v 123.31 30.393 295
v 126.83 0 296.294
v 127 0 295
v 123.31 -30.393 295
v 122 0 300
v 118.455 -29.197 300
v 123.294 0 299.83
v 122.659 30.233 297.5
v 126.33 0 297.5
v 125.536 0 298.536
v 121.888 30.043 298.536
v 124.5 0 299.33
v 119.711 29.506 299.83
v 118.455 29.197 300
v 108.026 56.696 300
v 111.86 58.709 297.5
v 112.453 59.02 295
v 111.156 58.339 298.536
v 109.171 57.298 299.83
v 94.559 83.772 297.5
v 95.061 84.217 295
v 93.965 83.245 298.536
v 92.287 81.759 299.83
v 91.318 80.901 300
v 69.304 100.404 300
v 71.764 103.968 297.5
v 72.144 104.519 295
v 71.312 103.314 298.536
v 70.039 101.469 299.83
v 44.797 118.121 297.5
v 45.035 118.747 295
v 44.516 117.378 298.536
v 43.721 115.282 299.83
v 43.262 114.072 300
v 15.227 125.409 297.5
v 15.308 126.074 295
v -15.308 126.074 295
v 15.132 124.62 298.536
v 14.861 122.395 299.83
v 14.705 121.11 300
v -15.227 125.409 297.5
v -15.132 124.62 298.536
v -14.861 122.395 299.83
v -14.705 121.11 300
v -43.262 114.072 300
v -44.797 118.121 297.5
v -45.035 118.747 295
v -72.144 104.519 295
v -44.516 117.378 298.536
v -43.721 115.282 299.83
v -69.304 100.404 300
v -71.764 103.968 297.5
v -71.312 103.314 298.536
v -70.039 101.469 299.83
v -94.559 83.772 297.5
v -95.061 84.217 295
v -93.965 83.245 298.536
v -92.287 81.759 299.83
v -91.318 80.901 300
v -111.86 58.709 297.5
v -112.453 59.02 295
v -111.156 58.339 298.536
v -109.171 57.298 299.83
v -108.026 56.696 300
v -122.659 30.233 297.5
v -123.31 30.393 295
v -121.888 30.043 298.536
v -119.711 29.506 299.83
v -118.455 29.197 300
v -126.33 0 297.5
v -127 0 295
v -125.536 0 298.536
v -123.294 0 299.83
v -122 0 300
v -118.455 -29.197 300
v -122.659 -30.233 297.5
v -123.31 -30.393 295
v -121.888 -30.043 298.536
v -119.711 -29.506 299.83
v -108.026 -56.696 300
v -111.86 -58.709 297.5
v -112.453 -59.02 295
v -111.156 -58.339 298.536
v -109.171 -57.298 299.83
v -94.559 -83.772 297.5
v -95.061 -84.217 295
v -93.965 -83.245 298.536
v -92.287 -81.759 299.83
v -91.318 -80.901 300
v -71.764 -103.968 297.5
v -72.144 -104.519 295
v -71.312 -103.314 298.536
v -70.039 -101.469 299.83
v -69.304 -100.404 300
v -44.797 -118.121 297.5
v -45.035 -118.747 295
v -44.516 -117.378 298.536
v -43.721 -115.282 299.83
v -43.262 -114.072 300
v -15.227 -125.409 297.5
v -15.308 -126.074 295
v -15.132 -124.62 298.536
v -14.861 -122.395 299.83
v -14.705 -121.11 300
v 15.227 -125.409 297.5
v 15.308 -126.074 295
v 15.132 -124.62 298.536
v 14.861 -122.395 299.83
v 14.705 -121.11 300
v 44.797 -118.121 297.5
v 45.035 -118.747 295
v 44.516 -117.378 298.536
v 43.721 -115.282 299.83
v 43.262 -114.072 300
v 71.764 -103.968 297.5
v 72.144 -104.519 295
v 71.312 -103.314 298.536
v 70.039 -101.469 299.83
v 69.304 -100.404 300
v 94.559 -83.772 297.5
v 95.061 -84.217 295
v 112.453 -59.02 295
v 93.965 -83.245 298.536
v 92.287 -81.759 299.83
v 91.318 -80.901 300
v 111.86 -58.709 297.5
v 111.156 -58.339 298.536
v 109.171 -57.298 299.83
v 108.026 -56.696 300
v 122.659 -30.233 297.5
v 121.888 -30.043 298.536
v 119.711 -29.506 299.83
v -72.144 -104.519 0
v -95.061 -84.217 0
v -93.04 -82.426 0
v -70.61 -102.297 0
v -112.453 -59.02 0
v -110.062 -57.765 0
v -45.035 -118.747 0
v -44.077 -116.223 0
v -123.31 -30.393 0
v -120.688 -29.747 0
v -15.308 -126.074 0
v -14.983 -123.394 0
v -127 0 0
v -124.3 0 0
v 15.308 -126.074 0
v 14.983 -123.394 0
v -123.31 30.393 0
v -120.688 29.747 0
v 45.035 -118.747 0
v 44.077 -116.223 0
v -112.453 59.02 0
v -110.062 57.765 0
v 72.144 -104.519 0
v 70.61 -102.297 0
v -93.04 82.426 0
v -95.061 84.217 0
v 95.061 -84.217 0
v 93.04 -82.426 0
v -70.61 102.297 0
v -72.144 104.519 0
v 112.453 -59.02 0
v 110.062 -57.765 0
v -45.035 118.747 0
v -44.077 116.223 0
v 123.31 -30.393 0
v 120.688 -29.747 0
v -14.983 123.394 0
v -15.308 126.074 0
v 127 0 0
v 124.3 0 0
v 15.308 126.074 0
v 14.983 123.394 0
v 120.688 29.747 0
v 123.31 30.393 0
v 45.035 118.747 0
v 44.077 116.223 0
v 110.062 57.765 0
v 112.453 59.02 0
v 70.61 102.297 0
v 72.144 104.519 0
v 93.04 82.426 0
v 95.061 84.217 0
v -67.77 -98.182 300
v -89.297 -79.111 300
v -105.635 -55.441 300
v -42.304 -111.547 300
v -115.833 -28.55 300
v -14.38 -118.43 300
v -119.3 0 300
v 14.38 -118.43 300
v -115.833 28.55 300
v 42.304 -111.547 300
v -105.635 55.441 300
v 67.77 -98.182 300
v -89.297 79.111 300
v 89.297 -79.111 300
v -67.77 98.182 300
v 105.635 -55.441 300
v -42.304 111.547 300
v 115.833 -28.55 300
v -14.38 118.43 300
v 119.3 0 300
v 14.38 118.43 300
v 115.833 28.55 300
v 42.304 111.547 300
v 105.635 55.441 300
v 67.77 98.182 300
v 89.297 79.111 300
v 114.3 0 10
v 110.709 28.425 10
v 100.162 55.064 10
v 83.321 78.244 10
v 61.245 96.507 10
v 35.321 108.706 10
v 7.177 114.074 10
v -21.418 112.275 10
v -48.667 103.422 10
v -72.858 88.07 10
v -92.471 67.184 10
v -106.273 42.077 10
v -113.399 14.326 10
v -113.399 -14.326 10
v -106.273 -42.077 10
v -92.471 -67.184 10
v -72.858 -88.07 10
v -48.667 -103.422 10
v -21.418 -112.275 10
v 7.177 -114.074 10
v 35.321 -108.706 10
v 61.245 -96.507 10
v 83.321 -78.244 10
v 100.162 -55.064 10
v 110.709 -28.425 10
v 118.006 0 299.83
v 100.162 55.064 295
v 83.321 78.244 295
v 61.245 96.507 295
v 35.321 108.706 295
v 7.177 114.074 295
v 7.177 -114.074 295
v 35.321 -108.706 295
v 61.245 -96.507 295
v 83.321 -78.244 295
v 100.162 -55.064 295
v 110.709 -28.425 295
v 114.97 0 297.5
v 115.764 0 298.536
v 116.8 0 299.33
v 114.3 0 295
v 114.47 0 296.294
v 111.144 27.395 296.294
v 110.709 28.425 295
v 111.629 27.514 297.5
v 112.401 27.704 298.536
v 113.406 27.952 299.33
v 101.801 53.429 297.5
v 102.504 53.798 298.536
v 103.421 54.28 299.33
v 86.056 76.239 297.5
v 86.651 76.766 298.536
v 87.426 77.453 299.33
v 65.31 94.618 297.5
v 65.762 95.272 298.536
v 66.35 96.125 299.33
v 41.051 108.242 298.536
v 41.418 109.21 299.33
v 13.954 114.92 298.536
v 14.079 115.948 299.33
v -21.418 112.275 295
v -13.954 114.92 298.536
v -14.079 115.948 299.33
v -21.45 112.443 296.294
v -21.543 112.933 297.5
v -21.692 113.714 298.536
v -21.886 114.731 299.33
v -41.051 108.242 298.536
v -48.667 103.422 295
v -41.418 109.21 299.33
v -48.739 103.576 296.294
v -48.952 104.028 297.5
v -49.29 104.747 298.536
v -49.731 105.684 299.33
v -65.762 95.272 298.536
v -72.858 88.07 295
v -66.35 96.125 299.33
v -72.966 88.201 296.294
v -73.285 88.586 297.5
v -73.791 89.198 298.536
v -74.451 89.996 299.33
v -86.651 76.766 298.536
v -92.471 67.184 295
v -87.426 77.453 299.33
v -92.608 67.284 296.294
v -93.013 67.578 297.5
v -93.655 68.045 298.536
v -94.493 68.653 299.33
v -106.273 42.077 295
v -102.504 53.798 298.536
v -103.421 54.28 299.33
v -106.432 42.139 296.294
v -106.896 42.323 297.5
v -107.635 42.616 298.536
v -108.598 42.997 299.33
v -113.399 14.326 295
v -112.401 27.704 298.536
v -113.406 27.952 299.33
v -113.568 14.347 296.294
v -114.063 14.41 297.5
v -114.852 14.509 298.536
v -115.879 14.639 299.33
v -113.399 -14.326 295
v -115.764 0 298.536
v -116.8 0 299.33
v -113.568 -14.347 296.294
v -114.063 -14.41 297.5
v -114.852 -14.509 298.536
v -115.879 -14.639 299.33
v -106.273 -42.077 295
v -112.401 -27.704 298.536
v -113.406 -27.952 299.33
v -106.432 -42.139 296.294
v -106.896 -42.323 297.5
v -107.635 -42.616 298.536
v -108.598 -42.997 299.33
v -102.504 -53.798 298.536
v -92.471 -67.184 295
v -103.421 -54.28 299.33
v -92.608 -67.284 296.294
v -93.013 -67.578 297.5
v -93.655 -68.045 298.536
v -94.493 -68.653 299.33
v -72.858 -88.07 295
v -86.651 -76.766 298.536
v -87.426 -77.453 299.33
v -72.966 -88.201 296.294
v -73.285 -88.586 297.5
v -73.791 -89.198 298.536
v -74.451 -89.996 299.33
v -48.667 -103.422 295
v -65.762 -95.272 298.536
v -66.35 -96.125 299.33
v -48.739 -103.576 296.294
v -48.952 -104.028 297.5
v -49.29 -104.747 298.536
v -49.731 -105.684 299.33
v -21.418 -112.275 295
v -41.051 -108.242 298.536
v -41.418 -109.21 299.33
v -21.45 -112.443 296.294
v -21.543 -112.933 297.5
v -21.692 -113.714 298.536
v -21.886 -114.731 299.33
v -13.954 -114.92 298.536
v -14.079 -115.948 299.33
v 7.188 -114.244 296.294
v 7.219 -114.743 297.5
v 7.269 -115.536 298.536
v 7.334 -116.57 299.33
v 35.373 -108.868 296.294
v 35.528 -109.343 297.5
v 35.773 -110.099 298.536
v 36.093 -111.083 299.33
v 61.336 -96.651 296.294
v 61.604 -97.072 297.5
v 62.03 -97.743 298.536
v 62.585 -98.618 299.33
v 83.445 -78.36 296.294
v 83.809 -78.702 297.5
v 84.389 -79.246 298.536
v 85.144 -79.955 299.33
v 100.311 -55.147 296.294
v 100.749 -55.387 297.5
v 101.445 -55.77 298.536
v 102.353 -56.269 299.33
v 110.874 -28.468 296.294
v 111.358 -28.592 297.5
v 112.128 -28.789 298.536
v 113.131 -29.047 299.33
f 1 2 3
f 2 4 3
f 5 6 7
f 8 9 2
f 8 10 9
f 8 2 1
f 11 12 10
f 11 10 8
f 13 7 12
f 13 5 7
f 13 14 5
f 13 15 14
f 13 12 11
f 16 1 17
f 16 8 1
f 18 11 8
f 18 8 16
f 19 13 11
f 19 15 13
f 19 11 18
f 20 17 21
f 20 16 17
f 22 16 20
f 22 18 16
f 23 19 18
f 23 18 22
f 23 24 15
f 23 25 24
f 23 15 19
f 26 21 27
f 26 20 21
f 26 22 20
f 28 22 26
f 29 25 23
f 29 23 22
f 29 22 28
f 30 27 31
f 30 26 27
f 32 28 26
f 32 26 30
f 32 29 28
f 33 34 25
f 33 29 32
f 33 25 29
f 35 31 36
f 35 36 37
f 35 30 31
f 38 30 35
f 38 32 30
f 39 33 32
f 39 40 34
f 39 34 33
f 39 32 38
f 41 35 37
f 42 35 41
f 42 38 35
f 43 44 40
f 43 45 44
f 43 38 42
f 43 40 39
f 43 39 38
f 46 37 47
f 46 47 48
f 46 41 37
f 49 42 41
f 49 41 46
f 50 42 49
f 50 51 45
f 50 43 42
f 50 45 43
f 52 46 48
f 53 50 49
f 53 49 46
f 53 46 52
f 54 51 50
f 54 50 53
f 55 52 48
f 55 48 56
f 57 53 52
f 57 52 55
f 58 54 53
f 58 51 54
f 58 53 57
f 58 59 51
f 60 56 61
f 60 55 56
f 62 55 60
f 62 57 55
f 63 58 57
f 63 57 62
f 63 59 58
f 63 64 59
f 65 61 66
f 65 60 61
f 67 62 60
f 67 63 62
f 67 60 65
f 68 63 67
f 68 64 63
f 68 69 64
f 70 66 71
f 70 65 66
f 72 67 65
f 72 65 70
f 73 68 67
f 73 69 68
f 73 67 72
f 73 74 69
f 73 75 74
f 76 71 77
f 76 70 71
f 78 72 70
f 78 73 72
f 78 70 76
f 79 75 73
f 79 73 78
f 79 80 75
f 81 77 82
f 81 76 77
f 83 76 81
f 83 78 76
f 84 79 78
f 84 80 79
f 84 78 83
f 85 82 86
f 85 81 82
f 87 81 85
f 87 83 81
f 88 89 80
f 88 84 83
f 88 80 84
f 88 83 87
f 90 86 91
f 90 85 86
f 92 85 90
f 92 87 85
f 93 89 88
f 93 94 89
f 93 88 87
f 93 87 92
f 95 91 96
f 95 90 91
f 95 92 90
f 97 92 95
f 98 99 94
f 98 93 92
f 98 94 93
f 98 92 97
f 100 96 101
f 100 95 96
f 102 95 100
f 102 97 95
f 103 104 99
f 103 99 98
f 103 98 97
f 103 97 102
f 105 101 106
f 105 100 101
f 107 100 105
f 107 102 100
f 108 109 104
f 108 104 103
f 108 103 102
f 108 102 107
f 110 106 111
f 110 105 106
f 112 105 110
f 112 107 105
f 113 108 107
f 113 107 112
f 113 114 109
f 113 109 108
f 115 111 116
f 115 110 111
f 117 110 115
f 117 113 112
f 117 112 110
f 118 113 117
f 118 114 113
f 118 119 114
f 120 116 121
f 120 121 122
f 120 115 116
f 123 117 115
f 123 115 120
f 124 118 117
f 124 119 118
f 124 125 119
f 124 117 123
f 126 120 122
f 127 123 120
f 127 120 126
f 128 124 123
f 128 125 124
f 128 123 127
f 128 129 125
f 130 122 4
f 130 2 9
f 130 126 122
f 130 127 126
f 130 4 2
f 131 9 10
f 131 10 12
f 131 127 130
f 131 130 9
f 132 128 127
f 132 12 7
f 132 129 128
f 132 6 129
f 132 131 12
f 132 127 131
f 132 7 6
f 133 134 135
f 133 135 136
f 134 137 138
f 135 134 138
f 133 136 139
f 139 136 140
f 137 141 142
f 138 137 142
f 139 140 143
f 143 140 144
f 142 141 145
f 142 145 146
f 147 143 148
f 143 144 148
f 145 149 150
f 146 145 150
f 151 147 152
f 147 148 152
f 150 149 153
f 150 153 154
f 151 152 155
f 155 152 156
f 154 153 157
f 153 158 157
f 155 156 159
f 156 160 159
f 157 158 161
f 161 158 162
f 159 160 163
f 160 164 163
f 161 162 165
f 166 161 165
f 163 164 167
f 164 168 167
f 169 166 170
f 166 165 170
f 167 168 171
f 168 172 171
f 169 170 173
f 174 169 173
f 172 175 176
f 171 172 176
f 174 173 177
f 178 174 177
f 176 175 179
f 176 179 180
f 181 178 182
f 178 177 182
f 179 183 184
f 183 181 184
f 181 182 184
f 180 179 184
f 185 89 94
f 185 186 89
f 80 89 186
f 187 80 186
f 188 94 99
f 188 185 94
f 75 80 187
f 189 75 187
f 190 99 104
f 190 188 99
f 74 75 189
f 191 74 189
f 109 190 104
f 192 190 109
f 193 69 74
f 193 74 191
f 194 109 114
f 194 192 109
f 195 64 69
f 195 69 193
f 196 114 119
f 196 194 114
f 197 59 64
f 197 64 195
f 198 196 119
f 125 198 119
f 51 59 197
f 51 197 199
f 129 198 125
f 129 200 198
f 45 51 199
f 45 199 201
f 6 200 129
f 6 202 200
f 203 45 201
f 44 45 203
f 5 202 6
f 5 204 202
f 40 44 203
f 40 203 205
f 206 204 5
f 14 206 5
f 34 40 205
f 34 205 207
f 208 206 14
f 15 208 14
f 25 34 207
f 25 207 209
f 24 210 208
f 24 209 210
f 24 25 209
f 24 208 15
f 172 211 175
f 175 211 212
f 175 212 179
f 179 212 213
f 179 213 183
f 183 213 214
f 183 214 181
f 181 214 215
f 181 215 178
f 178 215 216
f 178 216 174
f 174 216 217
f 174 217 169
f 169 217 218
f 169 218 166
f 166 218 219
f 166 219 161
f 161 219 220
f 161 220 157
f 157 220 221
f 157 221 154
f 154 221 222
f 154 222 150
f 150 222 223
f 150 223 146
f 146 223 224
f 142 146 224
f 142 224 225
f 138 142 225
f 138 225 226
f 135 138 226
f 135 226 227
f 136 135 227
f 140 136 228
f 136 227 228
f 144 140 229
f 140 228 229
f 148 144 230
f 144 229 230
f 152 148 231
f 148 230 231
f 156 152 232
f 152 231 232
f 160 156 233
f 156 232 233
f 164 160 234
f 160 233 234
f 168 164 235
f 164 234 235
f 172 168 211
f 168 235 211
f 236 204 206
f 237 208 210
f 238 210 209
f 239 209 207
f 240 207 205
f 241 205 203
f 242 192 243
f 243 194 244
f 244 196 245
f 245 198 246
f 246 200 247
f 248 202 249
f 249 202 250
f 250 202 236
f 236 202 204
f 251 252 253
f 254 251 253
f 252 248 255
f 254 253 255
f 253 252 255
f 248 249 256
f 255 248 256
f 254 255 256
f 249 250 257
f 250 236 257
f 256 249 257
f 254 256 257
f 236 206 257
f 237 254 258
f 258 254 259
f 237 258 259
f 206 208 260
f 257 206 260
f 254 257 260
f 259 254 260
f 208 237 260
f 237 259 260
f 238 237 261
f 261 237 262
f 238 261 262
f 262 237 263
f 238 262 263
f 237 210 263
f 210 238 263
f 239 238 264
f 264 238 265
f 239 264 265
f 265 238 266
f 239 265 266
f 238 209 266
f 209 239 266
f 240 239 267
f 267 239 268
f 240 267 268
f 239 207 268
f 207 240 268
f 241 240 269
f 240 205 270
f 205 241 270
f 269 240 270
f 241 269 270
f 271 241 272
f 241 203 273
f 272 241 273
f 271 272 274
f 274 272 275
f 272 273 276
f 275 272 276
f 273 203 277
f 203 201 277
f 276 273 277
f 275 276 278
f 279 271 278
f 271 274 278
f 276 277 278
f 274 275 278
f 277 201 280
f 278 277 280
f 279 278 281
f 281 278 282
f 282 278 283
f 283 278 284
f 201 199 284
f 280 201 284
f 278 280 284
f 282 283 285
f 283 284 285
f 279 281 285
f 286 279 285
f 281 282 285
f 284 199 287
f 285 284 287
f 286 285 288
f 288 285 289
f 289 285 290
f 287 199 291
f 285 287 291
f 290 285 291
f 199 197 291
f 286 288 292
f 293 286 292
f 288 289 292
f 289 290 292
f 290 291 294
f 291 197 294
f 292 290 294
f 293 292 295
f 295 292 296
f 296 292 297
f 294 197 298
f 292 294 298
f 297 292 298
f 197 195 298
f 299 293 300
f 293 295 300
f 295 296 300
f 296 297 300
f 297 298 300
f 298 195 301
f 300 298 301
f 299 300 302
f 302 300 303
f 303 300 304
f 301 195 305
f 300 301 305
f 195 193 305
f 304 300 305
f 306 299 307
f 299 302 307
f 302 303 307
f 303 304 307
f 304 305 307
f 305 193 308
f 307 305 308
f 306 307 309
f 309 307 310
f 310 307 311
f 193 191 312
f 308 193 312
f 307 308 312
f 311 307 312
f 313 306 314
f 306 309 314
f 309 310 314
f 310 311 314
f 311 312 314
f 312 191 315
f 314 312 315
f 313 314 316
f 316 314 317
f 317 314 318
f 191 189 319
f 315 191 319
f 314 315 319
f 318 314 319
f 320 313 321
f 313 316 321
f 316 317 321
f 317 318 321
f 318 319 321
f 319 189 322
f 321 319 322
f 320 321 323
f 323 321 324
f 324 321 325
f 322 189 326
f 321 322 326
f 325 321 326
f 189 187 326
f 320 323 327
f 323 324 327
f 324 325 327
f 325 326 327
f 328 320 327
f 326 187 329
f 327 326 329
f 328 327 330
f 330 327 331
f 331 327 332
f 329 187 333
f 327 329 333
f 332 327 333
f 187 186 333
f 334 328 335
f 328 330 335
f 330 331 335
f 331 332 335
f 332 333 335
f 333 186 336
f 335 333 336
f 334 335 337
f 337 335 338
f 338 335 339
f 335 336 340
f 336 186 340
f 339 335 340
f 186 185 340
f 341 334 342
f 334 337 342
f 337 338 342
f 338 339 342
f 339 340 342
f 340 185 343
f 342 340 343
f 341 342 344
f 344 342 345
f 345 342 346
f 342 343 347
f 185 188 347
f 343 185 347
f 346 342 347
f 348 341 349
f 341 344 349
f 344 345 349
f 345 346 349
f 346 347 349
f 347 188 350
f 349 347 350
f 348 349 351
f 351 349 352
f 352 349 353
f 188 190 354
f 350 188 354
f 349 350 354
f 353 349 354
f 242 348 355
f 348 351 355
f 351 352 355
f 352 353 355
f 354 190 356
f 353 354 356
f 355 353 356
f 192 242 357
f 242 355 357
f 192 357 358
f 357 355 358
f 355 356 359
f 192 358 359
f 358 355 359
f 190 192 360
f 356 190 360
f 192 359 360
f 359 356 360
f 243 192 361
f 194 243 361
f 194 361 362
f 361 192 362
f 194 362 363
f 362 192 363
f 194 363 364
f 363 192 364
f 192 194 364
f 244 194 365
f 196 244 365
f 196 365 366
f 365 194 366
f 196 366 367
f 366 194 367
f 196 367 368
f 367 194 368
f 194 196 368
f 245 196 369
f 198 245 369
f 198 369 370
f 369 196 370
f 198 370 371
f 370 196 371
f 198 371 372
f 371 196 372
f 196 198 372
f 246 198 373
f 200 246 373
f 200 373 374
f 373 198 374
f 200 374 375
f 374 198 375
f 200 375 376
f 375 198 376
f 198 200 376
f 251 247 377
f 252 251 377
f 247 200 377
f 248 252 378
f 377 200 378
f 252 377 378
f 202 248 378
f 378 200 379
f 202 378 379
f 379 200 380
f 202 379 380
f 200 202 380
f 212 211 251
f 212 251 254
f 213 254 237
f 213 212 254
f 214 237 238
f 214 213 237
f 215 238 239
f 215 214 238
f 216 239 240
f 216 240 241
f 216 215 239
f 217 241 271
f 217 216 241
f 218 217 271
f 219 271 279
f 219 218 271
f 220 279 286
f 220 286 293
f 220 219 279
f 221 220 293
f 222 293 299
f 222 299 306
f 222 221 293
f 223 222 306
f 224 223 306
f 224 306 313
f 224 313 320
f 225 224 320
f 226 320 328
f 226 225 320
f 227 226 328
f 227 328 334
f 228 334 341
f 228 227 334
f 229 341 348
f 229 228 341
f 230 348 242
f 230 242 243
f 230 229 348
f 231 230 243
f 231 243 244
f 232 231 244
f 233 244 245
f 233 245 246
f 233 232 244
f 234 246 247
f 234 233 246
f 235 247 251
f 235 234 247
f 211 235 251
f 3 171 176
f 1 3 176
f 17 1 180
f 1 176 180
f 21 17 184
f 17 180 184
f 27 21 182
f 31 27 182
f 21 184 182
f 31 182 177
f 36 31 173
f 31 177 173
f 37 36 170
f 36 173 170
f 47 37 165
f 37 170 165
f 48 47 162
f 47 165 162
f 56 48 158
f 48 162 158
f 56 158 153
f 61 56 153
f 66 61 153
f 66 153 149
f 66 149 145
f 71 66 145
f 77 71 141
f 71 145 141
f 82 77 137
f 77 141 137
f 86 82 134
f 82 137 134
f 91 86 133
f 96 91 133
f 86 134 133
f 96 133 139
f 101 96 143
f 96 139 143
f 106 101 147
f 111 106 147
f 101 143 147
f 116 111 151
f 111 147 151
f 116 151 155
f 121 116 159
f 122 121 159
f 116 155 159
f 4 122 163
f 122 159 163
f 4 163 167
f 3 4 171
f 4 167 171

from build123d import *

# Parameters (mm, degrees)
F0_R     = 127
F0_R_2   = 114.3
F1_DEPTH = 300
F2_R     = 5
F3_SIZE  = 10


with BuildPart() as f1:
    # F0 (on Top) → F1 (new body)
    with BuildSketch(Plane.XY):
        Circle(F0_R)
        Circle(F0_R_2, mode=Mode.SUBTRACT)
    extrude(amount=F1_DEPTH)

    # F2
    f2_edges = [f1.edges().sort_by_distance(p)[0] for p in [
        (-127, 0, 300),
        (-114.3, 0, 300),
    ]]
    fillet(f2_edges, radius=F2_R)

    # F3
    f3_edges = [f1.edges().sort_by_distance(p)[0] for p in [
        (-114.3, 0, 0),
    ]]
    chamfer(f3_edges, length=F3_SIZE)


solid = f1.part
